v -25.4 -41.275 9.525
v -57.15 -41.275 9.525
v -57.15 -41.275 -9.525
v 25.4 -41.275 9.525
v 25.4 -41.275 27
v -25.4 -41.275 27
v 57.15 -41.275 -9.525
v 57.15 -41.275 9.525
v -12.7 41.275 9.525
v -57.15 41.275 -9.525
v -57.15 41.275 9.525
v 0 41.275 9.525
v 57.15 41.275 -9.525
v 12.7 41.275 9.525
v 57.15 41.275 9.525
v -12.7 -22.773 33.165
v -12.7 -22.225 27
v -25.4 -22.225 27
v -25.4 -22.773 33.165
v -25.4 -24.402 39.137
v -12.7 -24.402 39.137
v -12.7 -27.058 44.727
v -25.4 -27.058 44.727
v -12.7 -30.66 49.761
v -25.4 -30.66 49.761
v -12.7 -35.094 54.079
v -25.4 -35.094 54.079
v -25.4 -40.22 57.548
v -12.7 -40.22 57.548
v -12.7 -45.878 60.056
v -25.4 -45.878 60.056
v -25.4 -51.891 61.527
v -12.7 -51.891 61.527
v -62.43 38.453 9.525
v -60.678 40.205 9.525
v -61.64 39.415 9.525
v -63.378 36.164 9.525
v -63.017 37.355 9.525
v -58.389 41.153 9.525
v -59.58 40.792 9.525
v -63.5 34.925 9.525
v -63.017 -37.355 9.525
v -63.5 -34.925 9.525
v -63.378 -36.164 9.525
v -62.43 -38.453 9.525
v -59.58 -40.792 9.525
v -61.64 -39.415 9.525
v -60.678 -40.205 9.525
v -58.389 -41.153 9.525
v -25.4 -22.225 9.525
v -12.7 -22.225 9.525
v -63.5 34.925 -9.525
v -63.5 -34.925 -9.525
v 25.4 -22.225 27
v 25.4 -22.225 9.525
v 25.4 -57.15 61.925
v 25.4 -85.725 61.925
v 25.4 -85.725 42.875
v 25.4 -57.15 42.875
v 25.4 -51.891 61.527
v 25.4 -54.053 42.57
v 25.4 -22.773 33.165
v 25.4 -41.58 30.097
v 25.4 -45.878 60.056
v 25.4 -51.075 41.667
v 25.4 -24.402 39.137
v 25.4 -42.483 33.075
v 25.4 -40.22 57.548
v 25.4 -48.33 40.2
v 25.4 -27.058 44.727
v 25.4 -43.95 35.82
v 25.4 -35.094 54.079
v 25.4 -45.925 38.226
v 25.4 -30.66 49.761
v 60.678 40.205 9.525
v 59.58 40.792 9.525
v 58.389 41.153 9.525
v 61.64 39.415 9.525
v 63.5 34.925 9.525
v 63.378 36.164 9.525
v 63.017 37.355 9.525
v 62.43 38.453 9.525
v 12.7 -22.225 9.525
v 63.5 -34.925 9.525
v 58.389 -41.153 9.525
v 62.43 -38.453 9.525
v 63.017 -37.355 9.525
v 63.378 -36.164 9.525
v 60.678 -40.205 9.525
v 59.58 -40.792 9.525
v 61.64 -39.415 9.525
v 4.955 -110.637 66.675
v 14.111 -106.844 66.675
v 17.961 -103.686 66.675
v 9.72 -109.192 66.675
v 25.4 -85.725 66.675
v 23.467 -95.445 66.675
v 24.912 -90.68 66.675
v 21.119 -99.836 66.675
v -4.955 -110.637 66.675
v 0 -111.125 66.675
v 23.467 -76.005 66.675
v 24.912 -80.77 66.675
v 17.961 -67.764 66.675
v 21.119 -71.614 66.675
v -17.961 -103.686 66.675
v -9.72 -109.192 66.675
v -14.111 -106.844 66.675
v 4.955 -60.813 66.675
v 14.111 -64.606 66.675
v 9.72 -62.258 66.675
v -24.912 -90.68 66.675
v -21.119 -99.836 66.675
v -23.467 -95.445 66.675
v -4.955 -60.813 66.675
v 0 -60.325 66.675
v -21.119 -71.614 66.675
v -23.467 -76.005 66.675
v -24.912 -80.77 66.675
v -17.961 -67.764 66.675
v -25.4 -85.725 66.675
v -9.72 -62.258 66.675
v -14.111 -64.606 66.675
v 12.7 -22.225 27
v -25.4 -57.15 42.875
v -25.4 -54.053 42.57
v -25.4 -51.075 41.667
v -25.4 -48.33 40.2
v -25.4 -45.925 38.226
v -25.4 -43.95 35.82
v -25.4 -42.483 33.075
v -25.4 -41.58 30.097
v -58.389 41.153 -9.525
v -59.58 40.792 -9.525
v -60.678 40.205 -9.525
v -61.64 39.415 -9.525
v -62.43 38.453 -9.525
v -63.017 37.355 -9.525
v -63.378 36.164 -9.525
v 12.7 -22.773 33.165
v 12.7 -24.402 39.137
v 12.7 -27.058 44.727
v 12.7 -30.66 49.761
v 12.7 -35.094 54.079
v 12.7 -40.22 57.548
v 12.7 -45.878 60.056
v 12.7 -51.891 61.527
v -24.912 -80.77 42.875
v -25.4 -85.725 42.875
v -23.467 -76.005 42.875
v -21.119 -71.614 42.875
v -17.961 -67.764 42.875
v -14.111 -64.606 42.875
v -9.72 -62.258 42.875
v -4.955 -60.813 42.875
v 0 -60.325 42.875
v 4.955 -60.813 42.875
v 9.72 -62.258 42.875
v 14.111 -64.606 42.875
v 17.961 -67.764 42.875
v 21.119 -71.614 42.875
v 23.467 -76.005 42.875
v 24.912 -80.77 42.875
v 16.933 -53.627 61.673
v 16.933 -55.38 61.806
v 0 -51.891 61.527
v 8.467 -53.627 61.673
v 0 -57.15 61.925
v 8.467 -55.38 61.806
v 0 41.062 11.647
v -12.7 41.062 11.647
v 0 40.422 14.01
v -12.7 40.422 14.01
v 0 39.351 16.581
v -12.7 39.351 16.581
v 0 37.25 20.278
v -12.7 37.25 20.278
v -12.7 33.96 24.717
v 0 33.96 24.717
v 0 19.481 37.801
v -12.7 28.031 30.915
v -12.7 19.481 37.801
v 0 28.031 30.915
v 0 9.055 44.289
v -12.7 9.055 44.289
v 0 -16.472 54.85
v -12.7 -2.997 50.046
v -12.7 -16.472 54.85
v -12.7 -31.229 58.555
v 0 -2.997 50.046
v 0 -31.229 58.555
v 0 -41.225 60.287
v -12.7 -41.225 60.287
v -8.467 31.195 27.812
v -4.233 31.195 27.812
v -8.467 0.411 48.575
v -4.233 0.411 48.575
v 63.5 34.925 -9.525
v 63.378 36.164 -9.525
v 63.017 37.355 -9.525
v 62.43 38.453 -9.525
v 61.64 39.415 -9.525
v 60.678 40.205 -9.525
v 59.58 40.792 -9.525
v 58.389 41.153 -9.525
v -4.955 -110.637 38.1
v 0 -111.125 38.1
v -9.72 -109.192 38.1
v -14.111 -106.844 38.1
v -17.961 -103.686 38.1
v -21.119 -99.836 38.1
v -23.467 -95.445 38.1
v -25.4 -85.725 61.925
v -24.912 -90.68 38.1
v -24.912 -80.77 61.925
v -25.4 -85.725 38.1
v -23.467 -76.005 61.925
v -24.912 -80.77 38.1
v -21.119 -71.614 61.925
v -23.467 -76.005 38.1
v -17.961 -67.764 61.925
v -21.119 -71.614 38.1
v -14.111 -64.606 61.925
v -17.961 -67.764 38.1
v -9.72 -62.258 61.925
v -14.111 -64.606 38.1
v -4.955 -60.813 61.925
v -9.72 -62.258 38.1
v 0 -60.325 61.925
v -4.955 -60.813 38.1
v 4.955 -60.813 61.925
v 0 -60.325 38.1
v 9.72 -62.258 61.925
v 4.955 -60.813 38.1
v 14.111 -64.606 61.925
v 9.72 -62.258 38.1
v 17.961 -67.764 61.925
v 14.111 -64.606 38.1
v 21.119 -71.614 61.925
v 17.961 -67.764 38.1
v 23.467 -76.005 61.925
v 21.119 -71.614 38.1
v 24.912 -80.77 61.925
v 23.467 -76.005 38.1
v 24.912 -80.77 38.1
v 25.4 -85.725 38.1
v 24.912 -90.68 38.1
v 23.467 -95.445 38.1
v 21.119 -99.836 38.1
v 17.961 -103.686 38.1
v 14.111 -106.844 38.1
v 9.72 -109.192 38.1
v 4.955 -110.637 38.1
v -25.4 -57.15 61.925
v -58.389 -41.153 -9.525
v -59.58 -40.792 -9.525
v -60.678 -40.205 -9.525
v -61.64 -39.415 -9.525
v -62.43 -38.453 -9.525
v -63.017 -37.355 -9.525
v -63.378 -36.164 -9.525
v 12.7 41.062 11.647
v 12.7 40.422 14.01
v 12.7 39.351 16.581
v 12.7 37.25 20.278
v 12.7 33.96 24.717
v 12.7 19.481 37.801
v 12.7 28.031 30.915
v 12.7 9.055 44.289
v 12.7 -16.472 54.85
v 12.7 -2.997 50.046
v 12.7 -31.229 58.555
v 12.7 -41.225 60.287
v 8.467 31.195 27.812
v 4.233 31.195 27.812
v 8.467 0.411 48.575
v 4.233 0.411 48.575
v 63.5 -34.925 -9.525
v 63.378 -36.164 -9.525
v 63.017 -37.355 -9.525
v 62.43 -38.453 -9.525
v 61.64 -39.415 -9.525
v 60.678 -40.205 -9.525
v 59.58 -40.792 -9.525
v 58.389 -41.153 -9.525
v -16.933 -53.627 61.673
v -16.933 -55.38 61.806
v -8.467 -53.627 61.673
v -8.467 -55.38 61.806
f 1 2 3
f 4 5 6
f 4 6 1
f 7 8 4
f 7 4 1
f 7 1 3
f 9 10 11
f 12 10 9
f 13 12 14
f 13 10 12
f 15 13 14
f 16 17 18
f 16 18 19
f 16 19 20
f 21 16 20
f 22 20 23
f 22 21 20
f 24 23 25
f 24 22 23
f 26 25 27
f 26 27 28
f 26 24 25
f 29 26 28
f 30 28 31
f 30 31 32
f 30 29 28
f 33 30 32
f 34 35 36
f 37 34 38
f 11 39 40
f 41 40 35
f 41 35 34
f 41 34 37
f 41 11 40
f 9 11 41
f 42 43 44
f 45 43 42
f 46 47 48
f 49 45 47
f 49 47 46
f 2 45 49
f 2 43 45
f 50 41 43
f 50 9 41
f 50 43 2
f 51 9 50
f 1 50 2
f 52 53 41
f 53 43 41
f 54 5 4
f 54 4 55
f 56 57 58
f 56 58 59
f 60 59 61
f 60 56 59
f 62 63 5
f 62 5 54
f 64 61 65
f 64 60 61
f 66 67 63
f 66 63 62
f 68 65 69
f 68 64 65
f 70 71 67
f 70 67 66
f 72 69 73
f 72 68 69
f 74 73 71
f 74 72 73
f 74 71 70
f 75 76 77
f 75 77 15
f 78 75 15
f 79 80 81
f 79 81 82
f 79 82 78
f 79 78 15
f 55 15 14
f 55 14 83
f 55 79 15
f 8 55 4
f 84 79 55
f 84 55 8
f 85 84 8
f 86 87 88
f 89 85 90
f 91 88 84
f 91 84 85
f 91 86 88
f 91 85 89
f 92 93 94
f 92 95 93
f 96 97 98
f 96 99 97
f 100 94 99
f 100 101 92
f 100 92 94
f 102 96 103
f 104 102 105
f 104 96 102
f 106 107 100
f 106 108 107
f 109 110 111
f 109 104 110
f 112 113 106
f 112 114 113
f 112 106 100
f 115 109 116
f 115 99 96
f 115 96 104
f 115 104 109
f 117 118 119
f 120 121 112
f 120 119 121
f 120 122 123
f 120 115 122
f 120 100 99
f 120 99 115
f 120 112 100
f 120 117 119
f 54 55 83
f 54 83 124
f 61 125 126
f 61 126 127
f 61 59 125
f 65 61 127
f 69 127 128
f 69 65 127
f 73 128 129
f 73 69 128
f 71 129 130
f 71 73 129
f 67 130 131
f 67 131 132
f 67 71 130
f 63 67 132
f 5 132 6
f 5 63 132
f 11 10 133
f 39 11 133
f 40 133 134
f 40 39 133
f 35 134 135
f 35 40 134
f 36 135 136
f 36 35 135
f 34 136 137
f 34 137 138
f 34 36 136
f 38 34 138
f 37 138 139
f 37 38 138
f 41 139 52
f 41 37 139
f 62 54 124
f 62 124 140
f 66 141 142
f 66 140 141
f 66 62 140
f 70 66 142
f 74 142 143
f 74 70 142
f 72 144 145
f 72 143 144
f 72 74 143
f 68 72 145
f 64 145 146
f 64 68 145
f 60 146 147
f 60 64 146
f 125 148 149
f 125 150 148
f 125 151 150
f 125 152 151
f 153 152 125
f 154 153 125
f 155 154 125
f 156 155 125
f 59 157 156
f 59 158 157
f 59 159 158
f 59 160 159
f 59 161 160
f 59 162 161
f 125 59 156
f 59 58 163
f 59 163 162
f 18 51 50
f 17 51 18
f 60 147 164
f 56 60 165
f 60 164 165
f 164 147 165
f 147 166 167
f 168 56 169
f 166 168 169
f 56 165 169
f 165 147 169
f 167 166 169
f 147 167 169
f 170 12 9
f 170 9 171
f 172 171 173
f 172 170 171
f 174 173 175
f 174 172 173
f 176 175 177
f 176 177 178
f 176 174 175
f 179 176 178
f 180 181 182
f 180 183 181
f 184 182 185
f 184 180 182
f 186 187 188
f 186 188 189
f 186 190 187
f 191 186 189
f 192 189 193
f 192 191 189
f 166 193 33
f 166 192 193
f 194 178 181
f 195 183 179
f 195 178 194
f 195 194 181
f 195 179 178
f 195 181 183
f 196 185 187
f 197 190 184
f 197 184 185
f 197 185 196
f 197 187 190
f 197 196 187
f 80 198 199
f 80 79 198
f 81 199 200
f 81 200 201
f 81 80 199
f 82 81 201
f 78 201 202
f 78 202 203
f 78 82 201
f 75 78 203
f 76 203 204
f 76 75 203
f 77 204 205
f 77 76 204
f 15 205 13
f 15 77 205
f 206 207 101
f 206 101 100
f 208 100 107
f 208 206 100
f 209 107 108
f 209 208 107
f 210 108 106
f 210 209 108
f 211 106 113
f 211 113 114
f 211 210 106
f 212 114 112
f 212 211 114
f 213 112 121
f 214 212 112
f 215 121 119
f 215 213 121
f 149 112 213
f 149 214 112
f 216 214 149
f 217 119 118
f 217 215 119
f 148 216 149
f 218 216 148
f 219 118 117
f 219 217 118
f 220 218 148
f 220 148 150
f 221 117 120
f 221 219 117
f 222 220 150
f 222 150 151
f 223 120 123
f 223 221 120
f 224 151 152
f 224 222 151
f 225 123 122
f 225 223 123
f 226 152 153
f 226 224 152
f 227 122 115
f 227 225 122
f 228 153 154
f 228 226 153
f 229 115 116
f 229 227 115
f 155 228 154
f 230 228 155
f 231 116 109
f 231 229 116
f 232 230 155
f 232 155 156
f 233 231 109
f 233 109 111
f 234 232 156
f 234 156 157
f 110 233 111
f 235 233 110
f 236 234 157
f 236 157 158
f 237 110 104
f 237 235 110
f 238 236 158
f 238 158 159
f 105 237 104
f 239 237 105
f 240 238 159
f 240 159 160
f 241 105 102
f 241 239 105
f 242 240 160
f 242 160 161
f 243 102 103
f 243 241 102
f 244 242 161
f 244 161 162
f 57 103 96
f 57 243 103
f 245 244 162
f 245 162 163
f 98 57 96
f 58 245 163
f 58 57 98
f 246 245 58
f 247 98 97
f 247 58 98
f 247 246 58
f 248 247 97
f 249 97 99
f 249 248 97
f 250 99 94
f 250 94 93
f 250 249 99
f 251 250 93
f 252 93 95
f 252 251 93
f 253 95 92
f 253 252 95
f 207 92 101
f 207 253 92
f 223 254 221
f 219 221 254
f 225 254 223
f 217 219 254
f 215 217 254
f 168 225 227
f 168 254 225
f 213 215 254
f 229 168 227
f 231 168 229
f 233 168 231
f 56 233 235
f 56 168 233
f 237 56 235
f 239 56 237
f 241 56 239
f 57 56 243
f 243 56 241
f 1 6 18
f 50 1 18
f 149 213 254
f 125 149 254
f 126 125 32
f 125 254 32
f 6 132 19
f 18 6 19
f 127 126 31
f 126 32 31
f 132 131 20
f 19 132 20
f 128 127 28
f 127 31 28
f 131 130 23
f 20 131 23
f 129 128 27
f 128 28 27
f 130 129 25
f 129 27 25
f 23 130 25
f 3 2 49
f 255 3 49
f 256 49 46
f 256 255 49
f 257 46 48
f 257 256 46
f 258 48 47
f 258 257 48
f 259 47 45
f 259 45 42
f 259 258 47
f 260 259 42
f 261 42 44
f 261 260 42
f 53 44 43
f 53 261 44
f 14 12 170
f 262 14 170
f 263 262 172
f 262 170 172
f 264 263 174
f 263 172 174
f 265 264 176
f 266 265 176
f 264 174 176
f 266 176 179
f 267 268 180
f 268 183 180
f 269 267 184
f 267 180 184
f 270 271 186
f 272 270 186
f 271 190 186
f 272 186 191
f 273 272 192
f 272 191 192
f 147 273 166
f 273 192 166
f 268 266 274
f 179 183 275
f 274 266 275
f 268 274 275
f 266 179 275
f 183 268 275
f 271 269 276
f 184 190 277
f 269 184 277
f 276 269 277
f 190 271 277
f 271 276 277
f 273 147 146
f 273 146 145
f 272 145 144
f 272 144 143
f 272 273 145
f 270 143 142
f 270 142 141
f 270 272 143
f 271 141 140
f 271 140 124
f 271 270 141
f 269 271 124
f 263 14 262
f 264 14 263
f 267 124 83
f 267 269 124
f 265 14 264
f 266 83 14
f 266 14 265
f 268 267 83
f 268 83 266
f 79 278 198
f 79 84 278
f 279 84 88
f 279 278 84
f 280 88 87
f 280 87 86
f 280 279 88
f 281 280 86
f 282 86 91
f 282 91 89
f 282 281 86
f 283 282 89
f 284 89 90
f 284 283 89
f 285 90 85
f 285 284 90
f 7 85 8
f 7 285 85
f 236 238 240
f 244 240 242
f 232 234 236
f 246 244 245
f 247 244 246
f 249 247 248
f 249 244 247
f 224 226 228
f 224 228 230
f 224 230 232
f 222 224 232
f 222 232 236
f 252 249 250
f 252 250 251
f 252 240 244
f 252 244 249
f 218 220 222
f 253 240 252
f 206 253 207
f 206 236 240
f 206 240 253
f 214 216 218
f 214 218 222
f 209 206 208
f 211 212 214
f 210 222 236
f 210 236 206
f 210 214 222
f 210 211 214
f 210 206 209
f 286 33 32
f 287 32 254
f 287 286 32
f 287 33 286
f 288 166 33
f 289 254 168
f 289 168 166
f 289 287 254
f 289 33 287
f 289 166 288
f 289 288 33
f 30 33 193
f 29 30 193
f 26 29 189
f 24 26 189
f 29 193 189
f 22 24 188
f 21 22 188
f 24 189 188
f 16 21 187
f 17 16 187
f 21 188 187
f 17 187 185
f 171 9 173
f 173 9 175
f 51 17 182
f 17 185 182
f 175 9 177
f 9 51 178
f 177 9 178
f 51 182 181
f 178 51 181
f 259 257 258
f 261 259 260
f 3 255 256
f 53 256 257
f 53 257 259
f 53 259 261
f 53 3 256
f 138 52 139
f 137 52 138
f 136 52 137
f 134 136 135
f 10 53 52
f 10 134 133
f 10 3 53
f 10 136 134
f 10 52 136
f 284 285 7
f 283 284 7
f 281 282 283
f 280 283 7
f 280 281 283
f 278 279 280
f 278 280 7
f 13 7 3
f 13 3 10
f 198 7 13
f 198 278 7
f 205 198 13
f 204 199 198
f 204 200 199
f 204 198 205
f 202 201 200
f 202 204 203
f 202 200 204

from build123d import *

# Parameters (mm, degrees)
F1_DEPTH = 63.5
F0_W     = 25.4
F0_H     = 19.05
F2_DEPTH = 25.4
F4_DEPTH = 12.7
F5_R     = 6.35


with BuildPart() as f1:
    # F0 (on Right) → F1 (new body, symmetric)
    with BuildSketch(Plane.YZ):
        Polygon((-41.275, 9.525), (-41.275, -9.525), (41.275, -9.525), (41.275, 9.525), (-22.225, 9.525), align=None)
    extrude(amount=F1_DEPTH, both=True)

    # F0 (on Right) → F2 (join, symmetric)
    with BuildSketch(Plane.YZ):
        with BuildLine():
            Line((-41.275, 27.0002), (-41.275, 9.525))
            Line((-41.275, 9.525), (-22.225, 9.525))
            Line((-22.225, 9.525), (-22.225, 27.0002))
            ThreePointArc((-22.225, 27.0002), (-30.6600167011, 49.7606132173), (-51.8906498109, 61.5269267575))
            add(Edge.make_bspline(
                [(-51.8906498109, 61.5269267575), (-53.6187990349, 61.680210909), (-55.3718909395, 61.8132821575), (-57.15, 61.9252)],
                knots=[108.5427292954, 108.5427292954, 108.5427292954, 108.5427292954, 111.5045361635, 111.5045361635, 111.5045361635, 111.5045361635], degree=3))
            Line((-57.15, 61.9252), (-60.325, 61.9252))
            Line((-60.325, 61.9252), (-60.325, 42.8752))
            Line((-60.325, 42.8752), (-57.15, 42.8752))
            ThreePointArc((-57.15, 42.8752), (-45.9246798487, 38.2255201513), (-41.275, 27.0002))
        make_face()
        with Locations((-73.025, 52.4002)):
            Rectangle(F0_W, F0_H)
    extrude(amount=F2_DEPTH, both=True)

    # F0 (on Right) → F3 (revolve)
    with BuildSketch(Plane.YZ):
        Polygon((-85.725, 38.1), (-85.725, 42.8752), (-85.725, 61.9252), (-85.725, 66.675), (-111.125, 66.675), (-111.125, 38.1), align=None)
    revolve(axis=Axis((0, -85.725, 52.3875), (0, 0, -1)))

    # F0 (on Right) → F4 (join, symmetric)
    with BuildSketch(Plane.YZ):
        with BuildLine():
            Line((-22.225, 9.525), (41.275, 9.525))
            add(Edge.make_bspline(
                [(41.275, 9.525), (41.275, 23.1452958025), (11.4416475843, 55.9094503662), (-51.8906498109, 61.5269267575)],
                knots=[0, 0, 0, 0, 108.5427292954, 108.5427292954, 108.5427292954, 108.5427292954], degree=3))
            ThreePointArc((-51.8906498109, 61.5269267575), (-30.6600167011, 49.7606132173), (-22.225, 27.0002))
            Line((-22.225, 27.0002), (-22.225, 9.525))
        make_face()
    extrude(amount=F4_DEPTH, both=True)

    # F5
    f5_edges = [f1.edges().sort_by_distance(p)[0] for p in [
        (-63.5, 41.275, 0),
        (-63.5, -41.275, 0),
        (63.5, 41.275, 0),
        (63.5, -41.275, 0),
    ]]
    fillet(f5_edges, radius=F5_R)


solid = f1.part
